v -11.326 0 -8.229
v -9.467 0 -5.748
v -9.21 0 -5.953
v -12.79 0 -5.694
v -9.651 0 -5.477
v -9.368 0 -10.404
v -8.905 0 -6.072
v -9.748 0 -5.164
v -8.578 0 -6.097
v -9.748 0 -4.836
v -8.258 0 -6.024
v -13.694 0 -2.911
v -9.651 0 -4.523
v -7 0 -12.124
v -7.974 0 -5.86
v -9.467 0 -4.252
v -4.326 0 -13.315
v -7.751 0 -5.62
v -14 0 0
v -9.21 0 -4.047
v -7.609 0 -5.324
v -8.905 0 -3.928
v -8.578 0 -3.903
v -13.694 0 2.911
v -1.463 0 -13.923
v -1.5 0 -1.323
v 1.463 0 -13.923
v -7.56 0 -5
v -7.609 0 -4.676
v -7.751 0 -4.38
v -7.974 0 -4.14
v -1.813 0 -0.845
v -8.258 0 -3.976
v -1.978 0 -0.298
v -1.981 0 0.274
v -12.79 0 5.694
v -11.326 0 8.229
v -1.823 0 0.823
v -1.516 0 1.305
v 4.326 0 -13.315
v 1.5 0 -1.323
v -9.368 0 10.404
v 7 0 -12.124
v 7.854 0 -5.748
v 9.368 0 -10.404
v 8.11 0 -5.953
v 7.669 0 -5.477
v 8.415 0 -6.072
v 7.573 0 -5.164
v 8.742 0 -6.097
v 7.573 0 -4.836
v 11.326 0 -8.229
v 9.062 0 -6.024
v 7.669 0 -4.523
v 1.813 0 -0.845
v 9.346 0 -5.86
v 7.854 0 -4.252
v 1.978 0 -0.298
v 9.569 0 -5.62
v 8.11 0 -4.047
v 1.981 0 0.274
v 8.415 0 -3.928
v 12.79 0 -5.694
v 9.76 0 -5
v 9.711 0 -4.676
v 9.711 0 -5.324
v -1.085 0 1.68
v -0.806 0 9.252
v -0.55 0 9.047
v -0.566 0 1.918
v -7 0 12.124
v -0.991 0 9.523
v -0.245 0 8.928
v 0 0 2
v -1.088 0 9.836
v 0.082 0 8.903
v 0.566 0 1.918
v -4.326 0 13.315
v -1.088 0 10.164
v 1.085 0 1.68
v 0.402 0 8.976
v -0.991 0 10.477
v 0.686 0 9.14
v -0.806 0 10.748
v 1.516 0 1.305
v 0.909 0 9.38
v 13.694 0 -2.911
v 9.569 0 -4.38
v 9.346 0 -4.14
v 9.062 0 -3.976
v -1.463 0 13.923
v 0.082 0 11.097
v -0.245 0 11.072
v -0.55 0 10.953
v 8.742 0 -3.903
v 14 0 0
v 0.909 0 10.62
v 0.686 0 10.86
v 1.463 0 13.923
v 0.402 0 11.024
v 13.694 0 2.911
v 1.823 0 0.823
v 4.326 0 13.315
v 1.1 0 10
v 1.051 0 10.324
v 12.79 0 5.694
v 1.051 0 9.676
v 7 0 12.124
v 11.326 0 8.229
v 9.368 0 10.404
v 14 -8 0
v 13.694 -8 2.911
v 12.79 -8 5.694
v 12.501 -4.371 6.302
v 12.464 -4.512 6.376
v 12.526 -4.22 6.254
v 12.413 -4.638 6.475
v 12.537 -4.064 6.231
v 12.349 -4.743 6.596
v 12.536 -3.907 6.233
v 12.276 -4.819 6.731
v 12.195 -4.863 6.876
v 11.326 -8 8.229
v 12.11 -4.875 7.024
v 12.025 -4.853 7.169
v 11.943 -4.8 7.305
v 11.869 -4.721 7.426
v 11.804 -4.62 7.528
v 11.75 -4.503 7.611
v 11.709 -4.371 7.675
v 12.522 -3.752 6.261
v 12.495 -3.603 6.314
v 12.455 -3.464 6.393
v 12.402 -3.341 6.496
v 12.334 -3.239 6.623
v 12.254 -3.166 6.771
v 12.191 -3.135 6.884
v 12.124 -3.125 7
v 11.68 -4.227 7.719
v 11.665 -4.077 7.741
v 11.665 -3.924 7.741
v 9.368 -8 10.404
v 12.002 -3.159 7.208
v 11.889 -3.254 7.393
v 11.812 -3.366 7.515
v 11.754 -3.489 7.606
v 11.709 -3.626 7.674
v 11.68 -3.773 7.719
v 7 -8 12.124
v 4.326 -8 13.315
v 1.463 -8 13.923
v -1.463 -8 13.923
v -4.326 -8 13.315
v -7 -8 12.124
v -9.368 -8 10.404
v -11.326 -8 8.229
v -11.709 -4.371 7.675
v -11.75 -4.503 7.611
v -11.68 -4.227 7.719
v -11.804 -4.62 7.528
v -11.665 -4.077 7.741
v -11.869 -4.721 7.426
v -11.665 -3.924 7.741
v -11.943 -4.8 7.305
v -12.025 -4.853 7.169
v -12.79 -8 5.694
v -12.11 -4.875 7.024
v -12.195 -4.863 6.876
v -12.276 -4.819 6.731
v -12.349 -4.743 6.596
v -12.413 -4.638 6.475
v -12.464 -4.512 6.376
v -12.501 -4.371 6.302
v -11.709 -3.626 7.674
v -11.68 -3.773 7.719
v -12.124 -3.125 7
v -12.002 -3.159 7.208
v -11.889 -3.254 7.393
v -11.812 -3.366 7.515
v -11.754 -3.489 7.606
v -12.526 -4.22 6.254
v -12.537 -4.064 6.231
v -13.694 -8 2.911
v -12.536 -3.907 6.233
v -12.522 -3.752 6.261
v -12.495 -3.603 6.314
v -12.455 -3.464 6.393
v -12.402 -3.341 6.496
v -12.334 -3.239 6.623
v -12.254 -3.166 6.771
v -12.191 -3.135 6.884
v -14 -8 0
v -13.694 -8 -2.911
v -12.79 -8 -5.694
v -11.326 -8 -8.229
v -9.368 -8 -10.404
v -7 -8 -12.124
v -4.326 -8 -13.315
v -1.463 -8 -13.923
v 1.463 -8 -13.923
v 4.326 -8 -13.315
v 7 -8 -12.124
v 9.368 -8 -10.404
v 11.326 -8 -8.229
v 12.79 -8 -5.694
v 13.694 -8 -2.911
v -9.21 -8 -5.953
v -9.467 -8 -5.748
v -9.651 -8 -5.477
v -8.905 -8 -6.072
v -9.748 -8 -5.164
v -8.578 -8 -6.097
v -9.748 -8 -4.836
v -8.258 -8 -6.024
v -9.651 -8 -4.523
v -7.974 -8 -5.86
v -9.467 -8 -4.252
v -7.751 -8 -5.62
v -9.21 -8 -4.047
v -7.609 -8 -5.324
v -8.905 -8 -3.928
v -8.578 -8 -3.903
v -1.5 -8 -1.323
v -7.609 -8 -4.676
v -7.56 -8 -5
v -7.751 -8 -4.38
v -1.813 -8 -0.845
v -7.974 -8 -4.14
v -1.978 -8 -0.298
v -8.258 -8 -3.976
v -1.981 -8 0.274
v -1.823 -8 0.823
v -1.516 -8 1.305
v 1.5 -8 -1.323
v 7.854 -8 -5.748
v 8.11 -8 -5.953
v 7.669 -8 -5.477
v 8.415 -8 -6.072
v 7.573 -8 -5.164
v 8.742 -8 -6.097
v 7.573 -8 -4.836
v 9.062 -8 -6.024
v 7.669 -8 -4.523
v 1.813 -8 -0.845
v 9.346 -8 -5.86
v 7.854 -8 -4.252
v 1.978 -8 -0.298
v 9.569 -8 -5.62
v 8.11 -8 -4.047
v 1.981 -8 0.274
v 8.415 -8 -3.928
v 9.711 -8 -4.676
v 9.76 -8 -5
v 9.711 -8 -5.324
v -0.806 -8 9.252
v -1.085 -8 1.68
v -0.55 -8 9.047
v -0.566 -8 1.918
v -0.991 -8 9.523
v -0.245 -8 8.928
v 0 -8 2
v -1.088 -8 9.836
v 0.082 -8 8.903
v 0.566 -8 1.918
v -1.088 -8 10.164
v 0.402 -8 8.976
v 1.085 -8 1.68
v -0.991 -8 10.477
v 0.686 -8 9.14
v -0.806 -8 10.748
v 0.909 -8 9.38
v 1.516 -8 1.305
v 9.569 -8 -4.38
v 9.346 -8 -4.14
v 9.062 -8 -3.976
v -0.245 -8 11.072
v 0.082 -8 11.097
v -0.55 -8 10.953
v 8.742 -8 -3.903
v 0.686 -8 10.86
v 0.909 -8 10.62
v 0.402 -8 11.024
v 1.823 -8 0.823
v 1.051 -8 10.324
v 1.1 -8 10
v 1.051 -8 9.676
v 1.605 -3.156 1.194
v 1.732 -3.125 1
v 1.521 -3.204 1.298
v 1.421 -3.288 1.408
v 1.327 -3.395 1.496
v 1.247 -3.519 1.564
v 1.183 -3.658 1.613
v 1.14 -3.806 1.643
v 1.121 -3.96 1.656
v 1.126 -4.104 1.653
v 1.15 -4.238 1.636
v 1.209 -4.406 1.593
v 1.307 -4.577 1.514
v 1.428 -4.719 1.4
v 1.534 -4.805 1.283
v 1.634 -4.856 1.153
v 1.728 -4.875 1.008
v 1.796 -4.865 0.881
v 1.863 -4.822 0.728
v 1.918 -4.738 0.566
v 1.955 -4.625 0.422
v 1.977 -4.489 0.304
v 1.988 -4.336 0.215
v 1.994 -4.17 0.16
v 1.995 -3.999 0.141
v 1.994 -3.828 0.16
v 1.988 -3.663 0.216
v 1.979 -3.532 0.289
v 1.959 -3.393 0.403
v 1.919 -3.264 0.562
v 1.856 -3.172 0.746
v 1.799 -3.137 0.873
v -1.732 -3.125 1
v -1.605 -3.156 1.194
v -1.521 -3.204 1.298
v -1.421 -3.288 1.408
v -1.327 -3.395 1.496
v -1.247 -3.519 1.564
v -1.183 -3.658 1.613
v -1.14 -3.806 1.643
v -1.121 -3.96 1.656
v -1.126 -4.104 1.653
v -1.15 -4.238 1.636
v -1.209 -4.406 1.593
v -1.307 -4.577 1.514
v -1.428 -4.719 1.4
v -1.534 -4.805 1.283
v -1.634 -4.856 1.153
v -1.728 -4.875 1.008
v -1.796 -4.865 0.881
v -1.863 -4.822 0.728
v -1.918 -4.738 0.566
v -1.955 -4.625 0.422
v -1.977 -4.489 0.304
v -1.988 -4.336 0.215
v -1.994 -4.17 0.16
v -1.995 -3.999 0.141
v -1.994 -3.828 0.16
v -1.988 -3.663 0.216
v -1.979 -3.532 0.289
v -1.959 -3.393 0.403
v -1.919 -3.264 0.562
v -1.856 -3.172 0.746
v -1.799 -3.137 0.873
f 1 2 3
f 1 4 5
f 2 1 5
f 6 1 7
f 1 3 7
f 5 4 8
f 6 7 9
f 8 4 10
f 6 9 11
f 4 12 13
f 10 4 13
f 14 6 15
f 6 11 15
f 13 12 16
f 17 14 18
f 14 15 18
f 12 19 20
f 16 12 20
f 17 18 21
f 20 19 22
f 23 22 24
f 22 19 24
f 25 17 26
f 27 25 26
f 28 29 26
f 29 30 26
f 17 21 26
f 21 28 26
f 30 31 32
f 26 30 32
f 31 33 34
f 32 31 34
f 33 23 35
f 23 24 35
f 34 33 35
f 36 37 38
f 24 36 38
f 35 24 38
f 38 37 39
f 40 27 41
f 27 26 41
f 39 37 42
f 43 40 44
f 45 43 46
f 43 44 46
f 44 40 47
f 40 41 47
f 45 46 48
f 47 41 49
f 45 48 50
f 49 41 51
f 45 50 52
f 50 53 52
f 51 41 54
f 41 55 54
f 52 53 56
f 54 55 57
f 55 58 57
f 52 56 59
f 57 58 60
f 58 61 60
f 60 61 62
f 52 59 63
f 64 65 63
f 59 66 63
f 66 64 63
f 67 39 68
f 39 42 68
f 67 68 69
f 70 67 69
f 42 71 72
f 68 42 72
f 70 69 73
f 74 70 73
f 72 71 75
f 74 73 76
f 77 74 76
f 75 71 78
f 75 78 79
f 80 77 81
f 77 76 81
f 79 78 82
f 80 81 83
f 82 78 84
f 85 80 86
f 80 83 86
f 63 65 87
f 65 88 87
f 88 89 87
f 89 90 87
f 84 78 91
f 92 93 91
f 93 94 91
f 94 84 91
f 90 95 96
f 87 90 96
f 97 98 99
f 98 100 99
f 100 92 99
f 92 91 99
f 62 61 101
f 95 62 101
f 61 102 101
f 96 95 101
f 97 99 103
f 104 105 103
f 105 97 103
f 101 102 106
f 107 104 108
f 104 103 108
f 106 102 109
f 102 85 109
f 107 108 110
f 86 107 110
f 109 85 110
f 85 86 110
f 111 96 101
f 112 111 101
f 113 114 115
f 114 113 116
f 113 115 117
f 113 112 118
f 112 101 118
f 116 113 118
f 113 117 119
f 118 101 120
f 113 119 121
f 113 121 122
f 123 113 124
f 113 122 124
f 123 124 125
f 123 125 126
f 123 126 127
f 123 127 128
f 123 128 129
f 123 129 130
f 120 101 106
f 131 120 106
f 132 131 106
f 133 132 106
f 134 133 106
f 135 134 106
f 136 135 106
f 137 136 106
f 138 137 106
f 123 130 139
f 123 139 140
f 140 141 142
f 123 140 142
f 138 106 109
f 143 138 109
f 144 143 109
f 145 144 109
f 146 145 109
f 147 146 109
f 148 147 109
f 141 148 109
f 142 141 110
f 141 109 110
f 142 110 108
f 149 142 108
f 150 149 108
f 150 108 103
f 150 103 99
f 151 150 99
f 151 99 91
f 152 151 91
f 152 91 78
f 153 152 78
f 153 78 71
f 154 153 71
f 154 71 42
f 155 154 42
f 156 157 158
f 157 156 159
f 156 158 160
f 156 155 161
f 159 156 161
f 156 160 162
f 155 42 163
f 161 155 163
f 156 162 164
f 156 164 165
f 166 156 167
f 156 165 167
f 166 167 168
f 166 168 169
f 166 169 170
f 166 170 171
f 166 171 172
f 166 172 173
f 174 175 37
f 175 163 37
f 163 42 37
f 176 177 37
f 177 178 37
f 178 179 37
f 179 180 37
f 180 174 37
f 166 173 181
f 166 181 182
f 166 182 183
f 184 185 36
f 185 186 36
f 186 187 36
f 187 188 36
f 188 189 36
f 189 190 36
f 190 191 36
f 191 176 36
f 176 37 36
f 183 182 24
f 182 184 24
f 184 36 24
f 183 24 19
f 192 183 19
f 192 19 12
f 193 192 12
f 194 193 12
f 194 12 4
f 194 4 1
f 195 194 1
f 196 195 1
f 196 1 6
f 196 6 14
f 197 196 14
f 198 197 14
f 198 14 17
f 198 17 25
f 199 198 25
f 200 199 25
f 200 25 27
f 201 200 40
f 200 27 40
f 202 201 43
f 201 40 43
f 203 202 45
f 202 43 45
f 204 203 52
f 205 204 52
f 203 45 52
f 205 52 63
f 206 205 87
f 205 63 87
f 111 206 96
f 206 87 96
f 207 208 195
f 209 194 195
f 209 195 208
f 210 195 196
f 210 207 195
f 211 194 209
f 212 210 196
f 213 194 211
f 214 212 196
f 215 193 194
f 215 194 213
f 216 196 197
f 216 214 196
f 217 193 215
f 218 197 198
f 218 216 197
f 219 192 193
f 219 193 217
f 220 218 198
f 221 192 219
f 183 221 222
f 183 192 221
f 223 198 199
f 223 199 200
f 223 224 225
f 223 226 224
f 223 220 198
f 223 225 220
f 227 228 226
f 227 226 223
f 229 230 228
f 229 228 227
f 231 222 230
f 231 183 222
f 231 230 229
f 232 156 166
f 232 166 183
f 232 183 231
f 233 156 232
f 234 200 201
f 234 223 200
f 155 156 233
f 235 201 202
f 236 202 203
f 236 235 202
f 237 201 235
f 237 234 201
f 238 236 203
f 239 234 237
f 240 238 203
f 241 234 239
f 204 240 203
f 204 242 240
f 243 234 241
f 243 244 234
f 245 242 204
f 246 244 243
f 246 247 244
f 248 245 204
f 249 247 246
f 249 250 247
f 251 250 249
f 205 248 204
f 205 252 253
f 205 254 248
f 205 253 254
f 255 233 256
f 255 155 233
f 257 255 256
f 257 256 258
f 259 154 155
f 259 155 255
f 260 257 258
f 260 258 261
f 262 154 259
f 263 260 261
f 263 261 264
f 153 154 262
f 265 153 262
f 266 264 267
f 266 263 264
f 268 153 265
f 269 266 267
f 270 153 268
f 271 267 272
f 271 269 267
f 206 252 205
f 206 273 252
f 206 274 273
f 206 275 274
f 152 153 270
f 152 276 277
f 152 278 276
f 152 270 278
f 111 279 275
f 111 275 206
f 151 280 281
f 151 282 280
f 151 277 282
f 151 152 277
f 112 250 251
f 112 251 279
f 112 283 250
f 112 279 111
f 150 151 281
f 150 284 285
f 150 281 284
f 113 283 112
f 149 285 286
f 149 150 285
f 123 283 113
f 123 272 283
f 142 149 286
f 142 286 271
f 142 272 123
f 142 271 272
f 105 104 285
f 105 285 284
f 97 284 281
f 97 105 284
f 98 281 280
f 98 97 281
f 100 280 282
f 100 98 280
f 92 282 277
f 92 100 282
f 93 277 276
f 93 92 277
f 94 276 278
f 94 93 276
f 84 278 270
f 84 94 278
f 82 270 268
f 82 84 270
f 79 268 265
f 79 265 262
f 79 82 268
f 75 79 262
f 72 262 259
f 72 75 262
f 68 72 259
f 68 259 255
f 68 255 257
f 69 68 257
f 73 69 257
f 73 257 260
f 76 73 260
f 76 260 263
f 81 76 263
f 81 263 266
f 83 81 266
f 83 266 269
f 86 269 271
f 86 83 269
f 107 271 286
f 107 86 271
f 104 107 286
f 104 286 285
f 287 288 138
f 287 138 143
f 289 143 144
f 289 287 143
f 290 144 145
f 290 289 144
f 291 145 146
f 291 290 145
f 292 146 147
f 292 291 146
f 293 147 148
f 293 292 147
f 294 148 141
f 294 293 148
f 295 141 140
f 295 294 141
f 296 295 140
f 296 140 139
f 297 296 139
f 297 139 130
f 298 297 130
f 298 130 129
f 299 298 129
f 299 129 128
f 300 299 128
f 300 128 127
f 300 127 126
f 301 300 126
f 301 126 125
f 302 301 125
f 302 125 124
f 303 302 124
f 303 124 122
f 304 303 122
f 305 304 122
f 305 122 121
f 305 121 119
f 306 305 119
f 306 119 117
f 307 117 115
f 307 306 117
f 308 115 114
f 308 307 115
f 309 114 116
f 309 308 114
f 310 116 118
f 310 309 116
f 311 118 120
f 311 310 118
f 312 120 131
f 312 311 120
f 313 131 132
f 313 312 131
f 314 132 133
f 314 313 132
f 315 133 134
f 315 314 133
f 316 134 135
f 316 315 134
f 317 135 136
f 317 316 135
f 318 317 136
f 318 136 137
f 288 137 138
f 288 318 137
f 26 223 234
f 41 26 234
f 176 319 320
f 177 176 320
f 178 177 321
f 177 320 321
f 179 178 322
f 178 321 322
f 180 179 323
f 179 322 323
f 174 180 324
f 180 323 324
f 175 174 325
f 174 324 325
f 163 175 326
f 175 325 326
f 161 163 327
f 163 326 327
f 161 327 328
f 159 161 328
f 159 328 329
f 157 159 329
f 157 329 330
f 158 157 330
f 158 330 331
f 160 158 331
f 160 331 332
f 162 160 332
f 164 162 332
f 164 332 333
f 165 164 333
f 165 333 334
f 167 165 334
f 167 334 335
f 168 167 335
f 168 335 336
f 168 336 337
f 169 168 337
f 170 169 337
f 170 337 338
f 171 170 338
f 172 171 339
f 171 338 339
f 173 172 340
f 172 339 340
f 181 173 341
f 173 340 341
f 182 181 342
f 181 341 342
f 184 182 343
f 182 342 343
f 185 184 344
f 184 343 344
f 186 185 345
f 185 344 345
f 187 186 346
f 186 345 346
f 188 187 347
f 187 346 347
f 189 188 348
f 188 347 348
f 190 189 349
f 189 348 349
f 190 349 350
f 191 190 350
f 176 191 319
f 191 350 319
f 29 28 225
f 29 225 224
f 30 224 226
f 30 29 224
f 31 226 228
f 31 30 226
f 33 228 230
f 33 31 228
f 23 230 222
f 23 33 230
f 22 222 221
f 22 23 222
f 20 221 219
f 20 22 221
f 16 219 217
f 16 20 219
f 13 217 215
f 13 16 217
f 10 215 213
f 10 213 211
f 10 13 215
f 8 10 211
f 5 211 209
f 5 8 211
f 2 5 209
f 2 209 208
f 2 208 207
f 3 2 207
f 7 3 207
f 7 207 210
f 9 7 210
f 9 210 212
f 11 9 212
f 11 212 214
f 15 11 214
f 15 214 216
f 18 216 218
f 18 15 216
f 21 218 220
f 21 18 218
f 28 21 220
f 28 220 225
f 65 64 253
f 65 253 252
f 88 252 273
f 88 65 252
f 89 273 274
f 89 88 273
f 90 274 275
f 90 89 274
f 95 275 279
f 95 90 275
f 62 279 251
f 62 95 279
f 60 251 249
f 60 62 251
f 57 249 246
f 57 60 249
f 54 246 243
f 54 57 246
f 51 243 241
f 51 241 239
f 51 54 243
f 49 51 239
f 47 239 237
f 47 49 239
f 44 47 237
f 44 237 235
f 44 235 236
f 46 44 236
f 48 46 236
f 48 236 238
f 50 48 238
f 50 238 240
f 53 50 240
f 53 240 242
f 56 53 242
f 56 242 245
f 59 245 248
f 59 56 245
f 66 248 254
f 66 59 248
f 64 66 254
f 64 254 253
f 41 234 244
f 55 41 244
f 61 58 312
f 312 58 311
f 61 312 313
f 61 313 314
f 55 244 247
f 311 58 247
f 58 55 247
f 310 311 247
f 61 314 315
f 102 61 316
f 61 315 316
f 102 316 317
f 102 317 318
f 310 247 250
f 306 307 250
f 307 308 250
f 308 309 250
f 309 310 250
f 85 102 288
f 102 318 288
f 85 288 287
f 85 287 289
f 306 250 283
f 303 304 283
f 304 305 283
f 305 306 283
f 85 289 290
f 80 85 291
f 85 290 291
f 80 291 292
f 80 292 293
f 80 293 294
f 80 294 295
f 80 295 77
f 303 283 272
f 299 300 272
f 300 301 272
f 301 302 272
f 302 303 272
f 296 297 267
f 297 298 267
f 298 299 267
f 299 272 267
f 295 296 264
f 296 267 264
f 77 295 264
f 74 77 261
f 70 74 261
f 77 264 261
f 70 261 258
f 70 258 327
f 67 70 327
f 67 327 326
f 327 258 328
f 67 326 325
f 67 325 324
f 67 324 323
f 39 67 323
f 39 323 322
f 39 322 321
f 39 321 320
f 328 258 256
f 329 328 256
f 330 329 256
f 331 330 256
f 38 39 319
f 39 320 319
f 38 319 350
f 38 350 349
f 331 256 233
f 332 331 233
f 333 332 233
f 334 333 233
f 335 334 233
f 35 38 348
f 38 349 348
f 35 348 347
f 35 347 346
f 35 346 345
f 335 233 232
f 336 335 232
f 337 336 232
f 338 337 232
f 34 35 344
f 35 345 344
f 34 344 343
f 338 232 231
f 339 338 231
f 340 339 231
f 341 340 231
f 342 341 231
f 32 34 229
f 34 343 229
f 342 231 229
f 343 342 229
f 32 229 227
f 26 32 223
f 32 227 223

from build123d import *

# Parameters (mm, degrees)
F0_R     = 14
F0_R_2   = 1.1
F1_DEPTH = 8
F3_DEPTH = 8.001
F6_R     = 0.875
F7_DEPTH = 19.125355653


# Not quite as in the source:
# - a pattern or mirror of a feature is missing from the dataset's text; its kind, count and spacing are read off the source's solid


with BuildPart() as f1:
    # F0 (on Front) → F1 (new body)
    with BuildSketch(Plane.XZ):
        Circle(F0_R)
        with Locations((-8.6602540378, -5)):
            Circle(F0_R_2, mode=Mode.SUBTRACT)
        with Locations((8.6602540378, -5)):
            Circle(F0_R_2, mode=Mode.SUBTRACT)
        with Locations((0, 10)):
            Circle(F0_R_2, mode=Mode.SUBTRACT)
    extrude(amount=F1_DEPTH)

    # F2 (on face) → F3 (cut, through all)
    with BuildSketch(Plane.XZ.offset(8)):
        with BuildLine():
            Line((-1.5, -1.3228756555), (1.5, -1.3228756555))
            ThreePointArc((1.5, -1.3228756555), (0, 2), (-1.5, -1.3228756555))
        make_face()
    extrude(amount=-F3_DEPTH, mode=Mode.SUBTRACT)

    # F6 (on line) → F7 (cut, through all)
    with BuildSketch(Plane(origin=(0, 0, 0), x_dir=(0, 1, 0), z_dir=(0.8660254038, 0, -0.5))):
        with Locations((-4, 0)):
            Circle(F6_R)
    f7 = extrude(amount=-F7_DEPTH, mode=Mode.SUBTRACT)

    # F7_copies: F7 across plane
    add(f7.mirror(Plane(origin=(1.9e-05, 0, 0), x_dir=(-1e-06, 0, 1), z_dir=(1, 0, 1e-06))), mode=Mode.SUBTRACT)


solid = f1.part
